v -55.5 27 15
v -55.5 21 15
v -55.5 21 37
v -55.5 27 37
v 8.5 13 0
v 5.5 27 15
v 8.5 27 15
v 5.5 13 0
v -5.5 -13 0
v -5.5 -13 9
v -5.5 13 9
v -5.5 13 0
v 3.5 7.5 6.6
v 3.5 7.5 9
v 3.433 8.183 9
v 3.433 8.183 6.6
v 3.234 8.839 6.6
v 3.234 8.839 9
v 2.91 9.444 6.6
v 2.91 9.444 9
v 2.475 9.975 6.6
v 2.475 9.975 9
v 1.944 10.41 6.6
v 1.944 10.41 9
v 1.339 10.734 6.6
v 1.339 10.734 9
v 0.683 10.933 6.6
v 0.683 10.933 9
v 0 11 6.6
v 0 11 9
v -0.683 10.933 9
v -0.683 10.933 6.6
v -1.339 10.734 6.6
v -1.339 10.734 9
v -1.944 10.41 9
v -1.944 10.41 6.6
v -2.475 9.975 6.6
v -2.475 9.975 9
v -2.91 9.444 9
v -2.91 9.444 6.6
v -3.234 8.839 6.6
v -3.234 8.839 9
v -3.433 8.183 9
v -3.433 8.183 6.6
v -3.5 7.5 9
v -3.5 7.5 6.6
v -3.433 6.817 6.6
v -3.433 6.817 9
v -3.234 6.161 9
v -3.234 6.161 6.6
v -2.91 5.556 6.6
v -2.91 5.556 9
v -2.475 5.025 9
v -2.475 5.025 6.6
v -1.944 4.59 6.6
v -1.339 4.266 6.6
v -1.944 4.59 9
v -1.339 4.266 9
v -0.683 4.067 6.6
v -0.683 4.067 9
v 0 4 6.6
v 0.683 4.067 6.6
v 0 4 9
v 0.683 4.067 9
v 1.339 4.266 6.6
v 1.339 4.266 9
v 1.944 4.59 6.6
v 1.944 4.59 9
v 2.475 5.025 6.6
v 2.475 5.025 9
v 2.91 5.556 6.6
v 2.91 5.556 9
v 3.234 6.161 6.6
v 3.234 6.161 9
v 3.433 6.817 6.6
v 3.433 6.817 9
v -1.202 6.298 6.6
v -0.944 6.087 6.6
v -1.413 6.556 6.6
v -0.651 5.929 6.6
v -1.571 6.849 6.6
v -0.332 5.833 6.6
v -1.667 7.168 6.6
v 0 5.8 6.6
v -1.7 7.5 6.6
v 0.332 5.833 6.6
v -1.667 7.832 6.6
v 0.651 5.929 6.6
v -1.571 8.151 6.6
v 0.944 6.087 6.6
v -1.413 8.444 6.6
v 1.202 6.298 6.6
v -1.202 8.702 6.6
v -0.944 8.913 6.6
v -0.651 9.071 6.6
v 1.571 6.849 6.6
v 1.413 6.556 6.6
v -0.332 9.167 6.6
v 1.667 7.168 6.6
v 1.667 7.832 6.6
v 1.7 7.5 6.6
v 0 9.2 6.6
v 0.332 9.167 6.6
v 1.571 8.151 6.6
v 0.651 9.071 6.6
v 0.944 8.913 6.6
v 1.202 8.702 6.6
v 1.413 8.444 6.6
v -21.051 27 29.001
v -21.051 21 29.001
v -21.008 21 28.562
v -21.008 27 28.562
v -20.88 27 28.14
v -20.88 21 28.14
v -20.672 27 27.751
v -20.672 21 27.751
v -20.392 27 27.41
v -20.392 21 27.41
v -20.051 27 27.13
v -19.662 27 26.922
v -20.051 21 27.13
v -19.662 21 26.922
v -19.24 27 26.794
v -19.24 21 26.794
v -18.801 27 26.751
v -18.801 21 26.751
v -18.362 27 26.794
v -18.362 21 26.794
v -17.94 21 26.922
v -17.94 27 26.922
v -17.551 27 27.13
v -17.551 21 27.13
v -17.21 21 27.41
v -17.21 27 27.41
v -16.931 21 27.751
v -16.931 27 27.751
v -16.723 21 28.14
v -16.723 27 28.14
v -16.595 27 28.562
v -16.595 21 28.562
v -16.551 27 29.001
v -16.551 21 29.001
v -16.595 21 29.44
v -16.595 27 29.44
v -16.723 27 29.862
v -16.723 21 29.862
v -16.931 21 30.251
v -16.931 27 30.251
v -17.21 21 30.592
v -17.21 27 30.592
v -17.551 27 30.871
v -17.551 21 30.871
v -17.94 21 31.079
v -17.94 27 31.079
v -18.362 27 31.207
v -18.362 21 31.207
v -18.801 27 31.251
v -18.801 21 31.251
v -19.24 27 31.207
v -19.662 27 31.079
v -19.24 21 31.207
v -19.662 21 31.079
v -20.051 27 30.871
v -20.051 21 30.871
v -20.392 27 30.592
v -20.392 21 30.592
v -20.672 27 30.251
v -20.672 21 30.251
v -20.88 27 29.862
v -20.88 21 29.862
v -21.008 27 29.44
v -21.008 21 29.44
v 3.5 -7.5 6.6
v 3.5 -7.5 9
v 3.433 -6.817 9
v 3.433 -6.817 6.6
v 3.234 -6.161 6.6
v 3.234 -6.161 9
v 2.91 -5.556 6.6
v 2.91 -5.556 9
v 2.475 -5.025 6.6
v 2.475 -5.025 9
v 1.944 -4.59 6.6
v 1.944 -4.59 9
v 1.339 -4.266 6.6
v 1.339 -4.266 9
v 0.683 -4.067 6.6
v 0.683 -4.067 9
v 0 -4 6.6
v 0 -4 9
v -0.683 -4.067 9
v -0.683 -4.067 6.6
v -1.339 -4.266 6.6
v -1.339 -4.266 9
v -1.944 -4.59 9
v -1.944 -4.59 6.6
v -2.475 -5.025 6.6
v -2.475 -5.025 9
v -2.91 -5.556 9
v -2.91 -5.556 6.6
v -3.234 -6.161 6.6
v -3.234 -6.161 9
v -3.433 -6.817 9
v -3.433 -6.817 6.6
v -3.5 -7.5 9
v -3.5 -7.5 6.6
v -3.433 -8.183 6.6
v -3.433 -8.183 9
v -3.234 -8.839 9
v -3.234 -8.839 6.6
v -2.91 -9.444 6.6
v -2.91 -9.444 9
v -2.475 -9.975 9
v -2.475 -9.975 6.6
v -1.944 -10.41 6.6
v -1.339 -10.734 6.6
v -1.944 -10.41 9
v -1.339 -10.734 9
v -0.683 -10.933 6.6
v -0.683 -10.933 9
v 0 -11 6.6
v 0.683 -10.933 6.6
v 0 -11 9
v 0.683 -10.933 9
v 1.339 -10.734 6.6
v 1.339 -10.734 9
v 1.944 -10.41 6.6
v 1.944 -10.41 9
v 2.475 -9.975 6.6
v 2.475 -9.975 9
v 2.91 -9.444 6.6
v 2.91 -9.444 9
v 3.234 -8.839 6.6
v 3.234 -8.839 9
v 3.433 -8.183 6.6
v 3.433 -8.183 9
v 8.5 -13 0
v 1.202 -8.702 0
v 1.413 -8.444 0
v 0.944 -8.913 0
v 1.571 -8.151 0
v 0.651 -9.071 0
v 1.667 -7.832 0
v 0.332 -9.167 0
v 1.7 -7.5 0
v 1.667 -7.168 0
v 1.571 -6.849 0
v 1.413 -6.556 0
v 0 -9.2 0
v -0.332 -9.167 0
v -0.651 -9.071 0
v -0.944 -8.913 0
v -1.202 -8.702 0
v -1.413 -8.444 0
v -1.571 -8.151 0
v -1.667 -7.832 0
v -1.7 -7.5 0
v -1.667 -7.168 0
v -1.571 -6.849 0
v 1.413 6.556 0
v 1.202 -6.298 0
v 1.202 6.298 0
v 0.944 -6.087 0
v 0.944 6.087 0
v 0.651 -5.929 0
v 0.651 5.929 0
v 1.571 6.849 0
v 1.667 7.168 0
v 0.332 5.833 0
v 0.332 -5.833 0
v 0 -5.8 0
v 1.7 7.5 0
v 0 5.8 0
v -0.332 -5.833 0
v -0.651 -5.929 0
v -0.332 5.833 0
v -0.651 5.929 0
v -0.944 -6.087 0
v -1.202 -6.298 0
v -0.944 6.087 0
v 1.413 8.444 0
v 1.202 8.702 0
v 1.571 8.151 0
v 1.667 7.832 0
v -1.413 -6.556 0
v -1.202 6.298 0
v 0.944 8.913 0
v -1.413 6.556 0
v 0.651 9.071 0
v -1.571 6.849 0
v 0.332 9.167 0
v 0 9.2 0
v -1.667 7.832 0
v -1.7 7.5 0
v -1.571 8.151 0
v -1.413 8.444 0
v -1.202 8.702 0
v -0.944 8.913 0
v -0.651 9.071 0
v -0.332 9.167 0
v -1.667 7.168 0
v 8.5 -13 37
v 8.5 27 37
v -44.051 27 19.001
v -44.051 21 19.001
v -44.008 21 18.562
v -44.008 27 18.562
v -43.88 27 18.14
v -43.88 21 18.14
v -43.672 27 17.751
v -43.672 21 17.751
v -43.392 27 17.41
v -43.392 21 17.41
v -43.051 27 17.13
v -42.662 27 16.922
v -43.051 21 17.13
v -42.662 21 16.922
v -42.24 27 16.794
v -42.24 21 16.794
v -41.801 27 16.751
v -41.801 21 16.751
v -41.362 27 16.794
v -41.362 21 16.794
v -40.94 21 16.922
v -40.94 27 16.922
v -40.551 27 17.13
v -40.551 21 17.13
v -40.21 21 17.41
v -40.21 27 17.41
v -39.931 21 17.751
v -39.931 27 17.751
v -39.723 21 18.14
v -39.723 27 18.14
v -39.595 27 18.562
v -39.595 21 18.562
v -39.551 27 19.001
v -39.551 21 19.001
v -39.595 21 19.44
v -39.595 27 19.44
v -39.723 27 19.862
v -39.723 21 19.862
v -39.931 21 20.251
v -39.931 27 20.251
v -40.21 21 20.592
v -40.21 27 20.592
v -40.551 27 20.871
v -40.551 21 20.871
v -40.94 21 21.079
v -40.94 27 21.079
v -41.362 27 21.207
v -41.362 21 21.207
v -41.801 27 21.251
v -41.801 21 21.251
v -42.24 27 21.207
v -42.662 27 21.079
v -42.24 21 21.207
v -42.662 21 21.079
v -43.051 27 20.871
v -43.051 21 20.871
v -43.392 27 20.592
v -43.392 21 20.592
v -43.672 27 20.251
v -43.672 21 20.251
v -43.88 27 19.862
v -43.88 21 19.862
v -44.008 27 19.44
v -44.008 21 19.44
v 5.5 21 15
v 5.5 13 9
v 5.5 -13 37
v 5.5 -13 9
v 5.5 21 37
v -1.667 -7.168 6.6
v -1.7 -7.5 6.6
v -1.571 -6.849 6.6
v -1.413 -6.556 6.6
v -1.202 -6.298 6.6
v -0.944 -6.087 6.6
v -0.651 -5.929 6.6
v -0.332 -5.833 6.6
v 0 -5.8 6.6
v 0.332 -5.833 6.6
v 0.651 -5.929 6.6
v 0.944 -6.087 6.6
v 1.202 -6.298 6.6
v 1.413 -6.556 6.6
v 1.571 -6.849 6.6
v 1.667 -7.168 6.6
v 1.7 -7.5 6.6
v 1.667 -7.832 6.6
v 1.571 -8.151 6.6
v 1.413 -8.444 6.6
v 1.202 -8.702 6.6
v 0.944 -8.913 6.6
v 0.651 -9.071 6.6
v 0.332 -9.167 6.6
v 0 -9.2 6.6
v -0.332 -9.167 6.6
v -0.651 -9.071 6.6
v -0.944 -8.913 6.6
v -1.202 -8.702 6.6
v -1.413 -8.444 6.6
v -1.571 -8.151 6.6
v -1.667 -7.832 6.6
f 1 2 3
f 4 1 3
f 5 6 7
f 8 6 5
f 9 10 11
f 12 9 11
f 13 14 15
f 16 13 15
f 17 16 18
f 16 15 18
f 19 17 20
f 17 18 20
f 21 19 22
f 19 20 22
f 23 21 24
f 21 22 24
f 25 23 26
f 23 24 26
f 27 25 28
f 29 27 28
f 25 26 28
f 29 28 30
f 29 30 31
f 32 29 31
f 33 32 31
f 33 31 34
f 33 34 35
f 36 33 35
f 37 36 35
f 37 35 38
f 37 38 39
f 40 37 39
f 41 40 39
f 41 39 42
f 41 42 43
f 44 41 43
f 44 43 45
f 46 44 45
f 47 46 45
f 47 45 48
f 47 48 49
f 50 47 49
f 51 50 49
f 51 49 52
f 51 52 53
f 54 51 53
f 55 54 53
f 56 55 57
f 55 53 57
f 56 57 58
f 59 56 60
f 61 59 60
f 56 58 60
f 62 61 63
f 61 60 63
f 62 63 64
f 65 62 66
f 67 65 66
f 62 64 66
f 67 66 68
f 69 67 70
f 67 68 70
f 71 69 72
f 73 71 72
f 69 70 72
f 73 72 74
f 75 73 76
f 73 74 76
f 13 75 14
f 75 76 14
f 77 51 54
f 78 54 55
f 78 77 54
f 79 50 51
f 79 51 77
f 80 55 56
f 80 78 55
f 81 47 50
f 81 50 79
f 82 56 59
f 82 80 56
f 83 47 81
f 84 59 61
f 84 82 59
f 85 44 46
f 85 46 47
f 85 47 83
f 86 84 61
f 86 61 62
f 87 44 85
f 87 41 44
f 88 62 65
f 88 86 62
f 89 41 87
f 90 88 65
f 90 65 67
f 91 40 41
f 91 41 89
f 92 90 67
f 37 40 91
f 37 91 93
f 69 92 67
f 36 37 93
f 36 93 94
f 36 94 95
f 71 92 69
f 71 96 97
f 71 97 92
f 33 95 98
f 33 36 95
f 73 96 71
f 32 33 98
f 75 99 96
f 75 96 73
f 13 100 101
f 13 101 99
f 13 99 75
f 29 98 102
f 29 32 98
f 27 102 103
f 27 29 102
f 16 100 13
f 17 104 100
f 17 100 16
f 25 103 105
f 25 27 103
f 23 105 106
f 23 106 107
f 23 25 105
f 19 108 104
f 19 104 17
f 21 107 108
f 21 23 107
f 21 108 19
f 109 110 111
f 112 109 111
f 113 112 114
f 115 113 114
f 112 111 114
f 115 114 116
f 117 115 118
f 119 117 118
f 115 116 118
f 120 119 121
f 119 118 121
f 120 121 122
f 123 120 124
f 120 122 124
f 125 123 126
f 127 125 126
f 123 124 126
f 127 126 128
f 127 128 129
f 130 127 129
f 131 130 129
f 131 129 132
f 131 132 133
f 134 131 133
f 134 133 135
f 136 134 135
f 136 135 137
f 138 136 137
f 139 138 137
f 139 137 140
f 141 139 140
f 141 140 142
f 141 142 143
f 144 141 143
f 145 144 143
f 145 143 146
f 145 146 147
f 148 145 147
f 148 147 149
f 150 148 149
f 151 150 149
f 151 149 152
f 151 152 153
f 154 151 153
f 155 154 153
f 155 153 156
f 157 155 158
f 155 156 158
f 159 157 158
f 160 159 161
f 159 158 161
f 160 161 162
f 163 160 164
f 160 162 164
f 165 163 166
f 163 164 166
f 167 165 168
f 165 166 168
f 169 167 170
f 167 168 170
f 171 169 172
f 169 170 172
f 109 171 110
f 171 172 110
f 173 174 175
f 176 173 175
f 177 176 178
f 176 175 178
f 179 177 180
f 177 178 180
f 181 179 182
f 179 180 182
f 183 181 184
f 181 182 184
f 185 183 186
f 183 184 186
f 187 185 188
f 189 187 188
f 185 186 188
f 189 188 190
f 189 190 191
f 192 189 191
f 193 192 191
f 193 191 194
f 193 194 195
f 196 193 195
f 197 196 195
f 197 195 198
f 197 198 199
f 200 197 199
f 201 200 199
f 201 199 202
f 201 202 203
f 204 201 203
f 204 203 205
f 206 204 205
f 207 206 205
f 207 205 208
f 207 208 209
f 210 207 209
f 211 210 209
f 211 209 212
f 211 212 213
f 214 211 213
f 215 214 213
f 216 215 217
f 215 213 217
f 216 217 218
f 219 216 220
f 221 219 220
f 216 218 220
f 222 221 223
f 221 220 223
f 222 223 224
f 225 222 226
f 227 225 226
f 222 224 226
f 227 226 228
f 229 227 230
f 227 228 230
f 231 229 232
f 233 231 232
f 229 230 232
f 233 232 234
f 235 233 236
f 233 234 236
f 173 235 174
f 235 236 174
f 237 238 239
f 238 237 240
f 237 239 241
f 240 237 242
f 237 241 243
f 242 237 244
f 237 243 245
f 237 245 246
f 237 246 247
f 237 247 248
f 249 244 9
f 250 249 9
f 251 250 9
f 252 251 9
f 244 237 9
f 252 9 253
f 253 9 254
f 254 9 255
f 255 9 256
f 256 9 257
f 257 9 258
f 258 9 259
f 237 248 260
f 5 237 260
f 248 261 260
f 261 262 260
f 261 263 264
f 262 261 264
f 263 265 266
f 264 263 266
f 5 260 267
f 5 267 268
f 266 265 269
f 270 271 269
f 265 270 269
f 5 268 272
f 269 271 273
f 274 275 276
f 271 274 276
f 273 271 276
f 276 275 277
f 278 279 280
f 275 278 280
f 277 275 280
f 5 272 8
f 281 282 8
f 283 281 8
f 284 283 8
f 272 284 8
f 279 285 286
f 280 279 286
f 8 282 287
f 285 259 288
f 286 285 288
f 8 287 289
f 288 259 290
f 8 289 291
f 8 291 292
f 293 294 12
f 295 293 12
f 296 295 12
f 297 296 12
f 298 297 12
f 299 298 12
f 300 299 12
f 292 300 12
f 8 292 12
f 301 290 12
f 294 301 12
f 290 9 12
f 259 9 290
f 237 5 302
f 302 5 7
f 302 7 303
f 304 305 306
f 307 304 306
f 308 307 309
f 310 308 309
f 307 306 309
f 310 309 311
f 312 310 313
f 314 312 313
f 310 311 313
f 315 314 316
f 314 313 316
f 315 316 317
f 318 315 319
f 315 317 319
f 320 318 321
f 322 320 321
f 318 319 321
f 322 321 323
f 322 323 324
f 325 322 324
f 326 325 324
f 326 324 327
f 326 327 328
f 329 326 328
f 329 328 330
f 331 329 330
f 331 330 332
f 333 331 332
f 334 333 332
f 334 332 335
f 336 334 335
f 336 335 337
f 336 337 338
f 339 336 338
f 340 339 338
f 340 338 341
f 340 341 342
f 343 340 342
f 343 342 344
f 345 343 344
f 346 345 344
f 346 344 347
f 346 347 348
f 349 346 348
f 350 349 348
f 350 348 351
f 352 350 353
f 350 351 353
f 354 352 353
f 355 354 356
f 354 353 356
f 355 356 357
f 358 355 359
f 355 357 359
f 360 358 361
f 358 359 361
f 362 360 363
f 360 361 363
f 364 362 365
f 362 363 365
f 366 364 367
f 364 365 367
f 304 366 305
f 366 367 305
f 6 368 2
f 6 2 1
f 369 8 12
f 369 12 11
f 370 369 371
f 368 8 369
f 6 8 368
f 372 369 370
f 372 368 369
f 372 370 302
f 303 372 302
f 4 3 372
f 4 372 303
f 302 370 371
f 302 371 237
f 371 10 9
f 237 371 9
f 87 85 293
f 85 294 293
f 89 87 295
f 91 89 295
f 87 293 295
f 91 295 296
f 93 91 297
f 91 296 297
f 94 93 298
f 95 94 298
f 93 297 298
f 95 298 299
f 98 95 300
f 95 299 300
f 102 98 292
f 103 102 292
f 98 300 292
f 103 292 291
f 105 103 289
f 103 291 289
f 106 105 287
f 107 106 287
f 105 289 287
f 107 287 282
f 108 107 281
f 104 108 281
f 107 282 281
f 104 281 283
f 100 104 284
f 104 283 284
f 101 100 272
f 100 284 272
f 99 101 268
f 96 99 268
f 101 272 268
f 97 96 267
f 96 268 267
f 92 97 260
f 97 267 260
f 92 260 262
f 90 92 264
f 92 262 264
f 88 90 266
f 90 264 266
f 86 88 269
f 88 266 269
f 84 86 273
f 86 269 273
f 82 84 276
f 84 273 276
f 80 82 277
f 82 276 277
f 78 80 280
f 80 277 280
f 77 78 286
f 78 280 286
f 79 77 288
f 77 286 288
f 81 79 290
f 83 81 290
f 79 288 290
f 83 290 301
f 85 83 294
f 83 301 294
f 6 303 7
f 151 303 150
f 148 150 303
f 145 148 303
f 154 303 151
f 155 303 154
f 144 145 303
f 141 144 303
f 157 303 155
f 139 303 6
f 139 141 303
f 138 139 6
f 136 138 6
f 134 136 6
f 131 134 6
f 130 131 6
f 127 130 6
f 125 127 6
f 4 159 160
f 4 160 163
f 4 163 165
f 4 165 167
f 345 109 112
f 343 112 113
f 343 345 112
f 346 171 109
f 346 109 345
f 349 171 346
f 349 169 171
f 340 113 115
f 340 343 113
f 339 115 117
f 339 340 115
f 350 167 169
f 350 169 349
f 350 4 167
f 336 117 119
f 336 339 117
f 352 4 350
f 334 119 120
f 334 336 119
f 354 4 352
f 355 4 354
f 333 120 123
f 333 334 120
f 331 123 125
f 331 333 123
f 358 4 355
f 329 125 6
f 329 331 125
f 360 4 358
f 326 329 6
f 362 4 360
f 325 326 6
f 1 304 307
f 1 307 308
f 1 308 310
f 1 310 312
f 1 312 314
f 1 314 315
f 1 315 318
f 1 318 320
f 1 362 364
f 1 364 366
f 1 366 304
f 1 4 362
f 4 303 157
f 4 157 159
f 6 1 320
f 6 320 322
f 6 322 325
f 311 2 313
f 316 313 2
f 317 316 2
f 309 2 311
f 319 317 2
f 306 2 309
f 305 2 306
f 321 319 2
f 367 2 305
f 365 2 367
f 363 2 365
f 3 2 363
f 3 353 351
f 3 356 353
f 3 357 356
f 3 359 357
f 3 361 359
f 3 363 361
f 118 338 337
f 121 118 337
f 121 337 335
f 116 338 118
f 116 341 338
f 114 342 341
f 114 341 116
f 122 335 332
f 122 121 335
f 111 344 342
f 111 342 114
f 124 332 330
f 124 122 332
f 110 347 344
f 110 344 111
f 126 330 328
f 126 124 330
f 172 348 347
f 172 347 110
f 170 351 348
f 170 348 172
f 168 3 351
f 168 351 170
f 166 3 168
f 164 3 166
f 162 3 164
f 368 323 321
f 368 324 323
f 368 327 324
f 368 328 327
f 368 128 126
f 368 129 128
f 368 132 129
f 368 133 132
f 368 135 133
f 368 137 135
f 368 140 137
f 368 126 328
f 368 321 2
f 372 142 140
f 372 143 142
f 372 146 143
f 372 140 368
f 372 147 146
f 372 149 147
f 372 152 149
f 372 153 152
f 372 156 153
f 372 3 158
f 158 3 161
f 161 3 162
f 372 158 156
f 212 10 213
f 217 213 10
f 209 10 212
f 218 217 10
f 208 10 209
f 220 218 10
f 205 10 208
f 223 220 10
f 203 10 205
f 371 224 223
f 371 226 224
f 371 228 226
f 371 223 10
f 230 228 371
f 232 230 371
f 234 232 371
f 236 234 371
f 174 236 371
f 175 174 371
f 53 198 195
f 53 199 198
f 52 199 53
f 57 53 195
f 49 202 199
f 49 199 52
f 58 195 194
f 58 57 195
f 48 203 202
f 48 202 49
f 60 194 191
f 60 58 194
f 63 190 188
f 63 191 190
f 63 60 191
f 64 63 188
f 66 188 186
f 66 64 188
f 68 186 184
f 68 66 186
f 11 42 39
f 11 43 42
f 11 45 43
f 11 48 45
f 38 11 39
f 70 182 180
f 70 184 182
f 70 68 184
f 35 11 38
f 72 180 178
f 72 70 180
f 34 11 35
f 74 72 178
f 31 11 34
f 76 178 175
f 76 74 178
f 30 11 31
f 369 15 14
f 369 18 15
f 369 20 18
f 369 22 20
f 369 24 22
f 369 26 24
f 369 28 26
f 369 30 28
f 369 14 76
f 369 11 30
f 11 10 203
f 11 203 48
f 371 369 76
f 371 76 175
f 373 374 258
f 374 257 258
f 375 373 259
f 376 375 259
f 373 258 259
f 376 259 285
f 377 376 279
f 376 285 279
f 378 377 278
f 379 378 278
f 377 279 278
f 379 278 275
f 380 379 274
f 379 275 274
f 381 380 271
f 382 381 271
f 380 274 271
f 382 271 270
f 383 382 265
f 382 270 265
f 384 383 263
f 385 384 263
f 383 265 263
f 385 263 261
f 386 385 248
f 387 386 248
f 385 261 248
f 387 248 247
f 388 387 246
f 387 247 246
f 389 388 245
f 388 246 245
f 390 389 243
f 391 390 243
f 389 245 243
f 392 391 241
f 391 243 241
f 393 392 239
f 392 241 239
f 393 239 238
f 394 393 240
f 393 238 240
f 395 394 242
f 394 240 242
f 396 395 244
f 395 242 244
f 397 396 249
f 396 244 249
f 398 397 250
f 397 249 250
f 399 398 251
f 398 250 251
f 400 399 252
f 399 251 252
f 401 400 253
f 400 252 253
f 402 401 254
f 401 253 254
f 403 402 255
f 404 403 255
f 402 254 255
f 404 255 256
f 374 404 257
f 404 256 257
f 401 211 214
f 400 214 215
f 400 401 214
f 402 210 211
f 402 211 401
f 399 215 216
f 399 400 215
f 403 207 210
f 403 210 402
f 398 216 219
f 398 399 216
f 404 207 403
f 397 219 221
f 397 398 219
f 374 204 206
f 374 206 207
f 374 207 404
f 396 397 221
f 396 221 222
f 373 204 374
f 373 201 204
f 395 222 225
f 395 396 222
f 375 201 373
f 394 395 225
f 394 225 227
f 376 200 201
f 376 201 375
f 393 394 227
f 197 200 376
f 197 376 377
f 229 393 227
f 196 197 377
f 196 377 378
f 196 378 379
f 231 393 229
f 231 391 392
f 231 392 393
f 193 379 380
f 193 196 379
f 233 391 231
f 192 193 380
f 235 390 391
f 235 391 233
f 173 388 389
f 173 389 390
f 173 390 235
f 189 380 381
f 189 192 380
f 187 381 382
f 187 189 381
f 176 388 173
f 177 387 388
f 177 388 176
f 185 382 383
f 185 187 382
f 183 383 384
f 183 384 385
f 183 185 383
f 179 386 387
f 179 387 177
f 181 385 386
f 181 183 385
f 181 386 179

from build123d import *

# Parameters (mm, degrees)
ESQUISSE1_W                                        = 11
ESQUISSE1_H                                        = 26
BOSS_EXTRU_1_DEPTH                                 = 9
CHAMBRAGE_POUR_VIS_T_TE_RONDE_BOMB_E_M_D           = 3.4
CHAMBRAGE_POUR_VIS_T_TE_RONDE_BOMB_E_M_CBORE_D     = 7
CHAMBRAGE_POUR_VIS_T_TE_RONDE_BOMB_E_M_CBORE_DEPTH = 2.4
BOSS_EXTRU_2_DEPTH                                 = 40
DIAM_TRE_DU_PER_AGE_4_5_4_5_1_D                    = 4.5
ESQUISSE20_W                                       = 11
ESQUISSE20_H                                       = 28
ENL_V_MAT_EXTRU_6_DEPTH                            = 78.776924598
ESQUISSE21_W                                       = 50
ESQUISSE21_H                                       = 34
ENL_V_MAT_EXTRU_7_DEPTH                            = 72.960058366
ESQUISSE23_W                                       = 11
ESQUISSE23_H                                       = 14
BOSS_EXTRU_3_DEPTH                                 = 37
ESQUISSE24_W                                       = 37
ESQUISSE24_H                                       = 40
BOSS_EXTRU_4_DEPTH                                 = 3
ESQUISSE27_W                                       = 11
ESQUISSE27_H                                       = 37
ENL_V_MAT_EXTRU_11_DEPTH                           = 8
ESQUISSE28_W                                       = 64
ESQUISSE28_H                                       = 15
ENL_V_MAT_EXTRU_12_DEPTH                           = 6
ESQUISSE30_W                                       = 15
ESQUISSE30_H                                       = 8
ENL_V_MAT_EXTRU_13_DEPTH                           = 77.282370178
BOSS_EXTRU_6_DEPTH                                 = 3


with BuildPart() as part:
    # Esquisse1 → Boss.-Extru.1 (new body)
    with BuildSketch(Plane.XY):
        Rectangle(ESQUISSE1_W, ESQUISSE1_H)
    extrude(amount=BOSS_EXTRU_1_DEPTH)

    # Chambrage pour vis à tête ronde bombée M31 (through all)
    with Locations(Plane.XY.offset(9)):
        with Locations((0, 7.5), (0, -7.5)):
            CounterBoreHole(CHAMBRAGE_POUR_VIS_T_TE_RONDE_BOMB_E_M_D / 2, CHAMBRAGE_POUR_VIS_T_TE_RONDE_BOMB_E_M_CBORE_D / 2, CHAMBRAGE_POUR_VIS_T_TE_RONDE_BOMB_E_M_CBORE_DEPTH)

    # Esquisse8 → Boss.-Extru.2 (add)
    with BuildSketch(Plane.XZ.offset(13)):
        Polygon((-55.5, 0), (-55.5, 37), (5.5, 37), (5.5, 9), (-5.5, 9), (-5.5, 0), align=None)
    extrude(amount=-BOSS_EXTRU_2_DEPTH)

    # Diamètre du perçage Ø4.5 (4.5)1 (through all)
    with Locations(Plane(origin=(0, 27, 0), x_dir=(1, 0, 0), z_dir=(0, 1, 0))):
        with Locations((-41.801370091, -19.00055804), (-18.801370091, -29.00055804)):
            Hole(DIAM_TRE_DU_PER_AGE_4_5_4_5_1_D / 2)

    # Esquisse20 → Enlèv. mat.-Extru.6 (cut, through all)
    with BuildSketch(Plane(origin=(0, 27, 0), x_dir=(1, 0, 0), z_dir=(0, 1, 0))):
        with Locations((0, -23)):
            Rectangle(ESQUISSE20_W, ESQUISSE20_H)
    extrude(amount=-ENL_V_MAT_EXTRU_6_DEPTH, mode=Mode.SUBTRACT)

    # Esquisse21 → Enlèv. mat.-Extru.7 (cut, through all)
    with BuildSketch(Plane.XY.offset(37)):
        with Locations((-30.5, 4)):
            Rectangle(ESQUISSE21_W, ESQUISSE21_H)
    extrude(amount=-ENL_V_MAT_EXTRU_7_DEPTH, mode=Mode.SUBTRACT)


with BuildPart() as enl_v_mat_extru_7_piece_1:
    # of the separate pieces the step leaves, piece 1, a body of its own (enl_v_mat_extru_7_pieces)
    add(part.part.solids().sort_by_distance((-5.5, 21, 0))[0])



with BuildPart() as enl_v_mat_extru_7_piece_2:
    # of the separate pieces the step leaves, piece 2, a body of its own (enl_v_mat_extru_7_pieces)
    add(part.part.solids().sort_by_distance((5.5, 13, 0))[0])


with BuildPart() as enl_v_mat_extru_7_piece_1_1:
    add(enl_v_mat_extru_7_piece_1.part)

    add(enl_v_mat_extru_7_piece_2.part)  # Boss.-Extru.3 merges Enlèv. mat.-Extru.7 piece 2
    # Esquisse23 → Boss.-Extru.3 (add, through all)
    with BuildSketch(Plane.XY.offset(37)):
        with Locations((0, 20)):
            Rectangle(ESQUISSE23_W, ESQUISSE23_H)
    extrude(amount=-BOSS_EXTRU_3_DEPTH)

    # Esquisse24 → Boss.-Extru.4 (add)
    with BuildSketch(Plane(origin=(5.5, 0, 0), x_dir=(0, 0, -1), z_dir=(1, 0, 0))):
        with Locations((-18.5, 7)):
            Rectangle(ESQUISSE24_W, ESQUISSE24_H)
    extrude(amount=BOSS_EXTRU_4_DEPTH)

    # Esquisse27 → Enlèv. mat.-Extru.11 (cut)
    with BuildSketch(Plane.XZ.offset(-21)):
        with Locations((0, 18.5)):
            Rectangle(ESQUISSE27_W, ESQUISSE27_H)
    extrude(amount=ENL_V_MAT_EXTRU_11_DEPTH, mode=Mode.SUBTRACT)

    # Esquisse28 → Enlèv. mat.-Extru.12 (cut)
    with BuildSketch(Plane(origin=(0, 27, 0), x_dir=(1, 0, 0), z_dir=(0, 1, 0))):
        with Locations((-23.5, -7.5)):
            Rectangle(ESQUISSE28_W, ESQUISSE28_H)
    extrude(amount=-ENL_V_MAT_EXTRU_12_DEPTH, mode=Mode.SUBTRACT)

    # Esquisse30 → Enlèv. mat.-Extru.13 (cut, through all)
    with BuildSketch(Plane.ZY.offset(-5.5)):
        with Locations((7.5, 17)):
            Rectangle(ESQUISSE30_W, ESQUISSE30_H)
    extrude(amount=-ENL_V_MAT_EXTRU_13_DEPTH, mode=Mode.SUBTRACT)

    # Esquisse31 → Boss.-Extru.6 (add, through all)
    with BuildSketch(Plane.ZY.offset(-5.5)):
        Polygon((15, 27), (0, 13), (15, 13), align=None)
    extrude(amount=-BOSS_EXTRU_6_DEPTH)


solid = enl_v_mat_extru_7_piece_1_1.part
